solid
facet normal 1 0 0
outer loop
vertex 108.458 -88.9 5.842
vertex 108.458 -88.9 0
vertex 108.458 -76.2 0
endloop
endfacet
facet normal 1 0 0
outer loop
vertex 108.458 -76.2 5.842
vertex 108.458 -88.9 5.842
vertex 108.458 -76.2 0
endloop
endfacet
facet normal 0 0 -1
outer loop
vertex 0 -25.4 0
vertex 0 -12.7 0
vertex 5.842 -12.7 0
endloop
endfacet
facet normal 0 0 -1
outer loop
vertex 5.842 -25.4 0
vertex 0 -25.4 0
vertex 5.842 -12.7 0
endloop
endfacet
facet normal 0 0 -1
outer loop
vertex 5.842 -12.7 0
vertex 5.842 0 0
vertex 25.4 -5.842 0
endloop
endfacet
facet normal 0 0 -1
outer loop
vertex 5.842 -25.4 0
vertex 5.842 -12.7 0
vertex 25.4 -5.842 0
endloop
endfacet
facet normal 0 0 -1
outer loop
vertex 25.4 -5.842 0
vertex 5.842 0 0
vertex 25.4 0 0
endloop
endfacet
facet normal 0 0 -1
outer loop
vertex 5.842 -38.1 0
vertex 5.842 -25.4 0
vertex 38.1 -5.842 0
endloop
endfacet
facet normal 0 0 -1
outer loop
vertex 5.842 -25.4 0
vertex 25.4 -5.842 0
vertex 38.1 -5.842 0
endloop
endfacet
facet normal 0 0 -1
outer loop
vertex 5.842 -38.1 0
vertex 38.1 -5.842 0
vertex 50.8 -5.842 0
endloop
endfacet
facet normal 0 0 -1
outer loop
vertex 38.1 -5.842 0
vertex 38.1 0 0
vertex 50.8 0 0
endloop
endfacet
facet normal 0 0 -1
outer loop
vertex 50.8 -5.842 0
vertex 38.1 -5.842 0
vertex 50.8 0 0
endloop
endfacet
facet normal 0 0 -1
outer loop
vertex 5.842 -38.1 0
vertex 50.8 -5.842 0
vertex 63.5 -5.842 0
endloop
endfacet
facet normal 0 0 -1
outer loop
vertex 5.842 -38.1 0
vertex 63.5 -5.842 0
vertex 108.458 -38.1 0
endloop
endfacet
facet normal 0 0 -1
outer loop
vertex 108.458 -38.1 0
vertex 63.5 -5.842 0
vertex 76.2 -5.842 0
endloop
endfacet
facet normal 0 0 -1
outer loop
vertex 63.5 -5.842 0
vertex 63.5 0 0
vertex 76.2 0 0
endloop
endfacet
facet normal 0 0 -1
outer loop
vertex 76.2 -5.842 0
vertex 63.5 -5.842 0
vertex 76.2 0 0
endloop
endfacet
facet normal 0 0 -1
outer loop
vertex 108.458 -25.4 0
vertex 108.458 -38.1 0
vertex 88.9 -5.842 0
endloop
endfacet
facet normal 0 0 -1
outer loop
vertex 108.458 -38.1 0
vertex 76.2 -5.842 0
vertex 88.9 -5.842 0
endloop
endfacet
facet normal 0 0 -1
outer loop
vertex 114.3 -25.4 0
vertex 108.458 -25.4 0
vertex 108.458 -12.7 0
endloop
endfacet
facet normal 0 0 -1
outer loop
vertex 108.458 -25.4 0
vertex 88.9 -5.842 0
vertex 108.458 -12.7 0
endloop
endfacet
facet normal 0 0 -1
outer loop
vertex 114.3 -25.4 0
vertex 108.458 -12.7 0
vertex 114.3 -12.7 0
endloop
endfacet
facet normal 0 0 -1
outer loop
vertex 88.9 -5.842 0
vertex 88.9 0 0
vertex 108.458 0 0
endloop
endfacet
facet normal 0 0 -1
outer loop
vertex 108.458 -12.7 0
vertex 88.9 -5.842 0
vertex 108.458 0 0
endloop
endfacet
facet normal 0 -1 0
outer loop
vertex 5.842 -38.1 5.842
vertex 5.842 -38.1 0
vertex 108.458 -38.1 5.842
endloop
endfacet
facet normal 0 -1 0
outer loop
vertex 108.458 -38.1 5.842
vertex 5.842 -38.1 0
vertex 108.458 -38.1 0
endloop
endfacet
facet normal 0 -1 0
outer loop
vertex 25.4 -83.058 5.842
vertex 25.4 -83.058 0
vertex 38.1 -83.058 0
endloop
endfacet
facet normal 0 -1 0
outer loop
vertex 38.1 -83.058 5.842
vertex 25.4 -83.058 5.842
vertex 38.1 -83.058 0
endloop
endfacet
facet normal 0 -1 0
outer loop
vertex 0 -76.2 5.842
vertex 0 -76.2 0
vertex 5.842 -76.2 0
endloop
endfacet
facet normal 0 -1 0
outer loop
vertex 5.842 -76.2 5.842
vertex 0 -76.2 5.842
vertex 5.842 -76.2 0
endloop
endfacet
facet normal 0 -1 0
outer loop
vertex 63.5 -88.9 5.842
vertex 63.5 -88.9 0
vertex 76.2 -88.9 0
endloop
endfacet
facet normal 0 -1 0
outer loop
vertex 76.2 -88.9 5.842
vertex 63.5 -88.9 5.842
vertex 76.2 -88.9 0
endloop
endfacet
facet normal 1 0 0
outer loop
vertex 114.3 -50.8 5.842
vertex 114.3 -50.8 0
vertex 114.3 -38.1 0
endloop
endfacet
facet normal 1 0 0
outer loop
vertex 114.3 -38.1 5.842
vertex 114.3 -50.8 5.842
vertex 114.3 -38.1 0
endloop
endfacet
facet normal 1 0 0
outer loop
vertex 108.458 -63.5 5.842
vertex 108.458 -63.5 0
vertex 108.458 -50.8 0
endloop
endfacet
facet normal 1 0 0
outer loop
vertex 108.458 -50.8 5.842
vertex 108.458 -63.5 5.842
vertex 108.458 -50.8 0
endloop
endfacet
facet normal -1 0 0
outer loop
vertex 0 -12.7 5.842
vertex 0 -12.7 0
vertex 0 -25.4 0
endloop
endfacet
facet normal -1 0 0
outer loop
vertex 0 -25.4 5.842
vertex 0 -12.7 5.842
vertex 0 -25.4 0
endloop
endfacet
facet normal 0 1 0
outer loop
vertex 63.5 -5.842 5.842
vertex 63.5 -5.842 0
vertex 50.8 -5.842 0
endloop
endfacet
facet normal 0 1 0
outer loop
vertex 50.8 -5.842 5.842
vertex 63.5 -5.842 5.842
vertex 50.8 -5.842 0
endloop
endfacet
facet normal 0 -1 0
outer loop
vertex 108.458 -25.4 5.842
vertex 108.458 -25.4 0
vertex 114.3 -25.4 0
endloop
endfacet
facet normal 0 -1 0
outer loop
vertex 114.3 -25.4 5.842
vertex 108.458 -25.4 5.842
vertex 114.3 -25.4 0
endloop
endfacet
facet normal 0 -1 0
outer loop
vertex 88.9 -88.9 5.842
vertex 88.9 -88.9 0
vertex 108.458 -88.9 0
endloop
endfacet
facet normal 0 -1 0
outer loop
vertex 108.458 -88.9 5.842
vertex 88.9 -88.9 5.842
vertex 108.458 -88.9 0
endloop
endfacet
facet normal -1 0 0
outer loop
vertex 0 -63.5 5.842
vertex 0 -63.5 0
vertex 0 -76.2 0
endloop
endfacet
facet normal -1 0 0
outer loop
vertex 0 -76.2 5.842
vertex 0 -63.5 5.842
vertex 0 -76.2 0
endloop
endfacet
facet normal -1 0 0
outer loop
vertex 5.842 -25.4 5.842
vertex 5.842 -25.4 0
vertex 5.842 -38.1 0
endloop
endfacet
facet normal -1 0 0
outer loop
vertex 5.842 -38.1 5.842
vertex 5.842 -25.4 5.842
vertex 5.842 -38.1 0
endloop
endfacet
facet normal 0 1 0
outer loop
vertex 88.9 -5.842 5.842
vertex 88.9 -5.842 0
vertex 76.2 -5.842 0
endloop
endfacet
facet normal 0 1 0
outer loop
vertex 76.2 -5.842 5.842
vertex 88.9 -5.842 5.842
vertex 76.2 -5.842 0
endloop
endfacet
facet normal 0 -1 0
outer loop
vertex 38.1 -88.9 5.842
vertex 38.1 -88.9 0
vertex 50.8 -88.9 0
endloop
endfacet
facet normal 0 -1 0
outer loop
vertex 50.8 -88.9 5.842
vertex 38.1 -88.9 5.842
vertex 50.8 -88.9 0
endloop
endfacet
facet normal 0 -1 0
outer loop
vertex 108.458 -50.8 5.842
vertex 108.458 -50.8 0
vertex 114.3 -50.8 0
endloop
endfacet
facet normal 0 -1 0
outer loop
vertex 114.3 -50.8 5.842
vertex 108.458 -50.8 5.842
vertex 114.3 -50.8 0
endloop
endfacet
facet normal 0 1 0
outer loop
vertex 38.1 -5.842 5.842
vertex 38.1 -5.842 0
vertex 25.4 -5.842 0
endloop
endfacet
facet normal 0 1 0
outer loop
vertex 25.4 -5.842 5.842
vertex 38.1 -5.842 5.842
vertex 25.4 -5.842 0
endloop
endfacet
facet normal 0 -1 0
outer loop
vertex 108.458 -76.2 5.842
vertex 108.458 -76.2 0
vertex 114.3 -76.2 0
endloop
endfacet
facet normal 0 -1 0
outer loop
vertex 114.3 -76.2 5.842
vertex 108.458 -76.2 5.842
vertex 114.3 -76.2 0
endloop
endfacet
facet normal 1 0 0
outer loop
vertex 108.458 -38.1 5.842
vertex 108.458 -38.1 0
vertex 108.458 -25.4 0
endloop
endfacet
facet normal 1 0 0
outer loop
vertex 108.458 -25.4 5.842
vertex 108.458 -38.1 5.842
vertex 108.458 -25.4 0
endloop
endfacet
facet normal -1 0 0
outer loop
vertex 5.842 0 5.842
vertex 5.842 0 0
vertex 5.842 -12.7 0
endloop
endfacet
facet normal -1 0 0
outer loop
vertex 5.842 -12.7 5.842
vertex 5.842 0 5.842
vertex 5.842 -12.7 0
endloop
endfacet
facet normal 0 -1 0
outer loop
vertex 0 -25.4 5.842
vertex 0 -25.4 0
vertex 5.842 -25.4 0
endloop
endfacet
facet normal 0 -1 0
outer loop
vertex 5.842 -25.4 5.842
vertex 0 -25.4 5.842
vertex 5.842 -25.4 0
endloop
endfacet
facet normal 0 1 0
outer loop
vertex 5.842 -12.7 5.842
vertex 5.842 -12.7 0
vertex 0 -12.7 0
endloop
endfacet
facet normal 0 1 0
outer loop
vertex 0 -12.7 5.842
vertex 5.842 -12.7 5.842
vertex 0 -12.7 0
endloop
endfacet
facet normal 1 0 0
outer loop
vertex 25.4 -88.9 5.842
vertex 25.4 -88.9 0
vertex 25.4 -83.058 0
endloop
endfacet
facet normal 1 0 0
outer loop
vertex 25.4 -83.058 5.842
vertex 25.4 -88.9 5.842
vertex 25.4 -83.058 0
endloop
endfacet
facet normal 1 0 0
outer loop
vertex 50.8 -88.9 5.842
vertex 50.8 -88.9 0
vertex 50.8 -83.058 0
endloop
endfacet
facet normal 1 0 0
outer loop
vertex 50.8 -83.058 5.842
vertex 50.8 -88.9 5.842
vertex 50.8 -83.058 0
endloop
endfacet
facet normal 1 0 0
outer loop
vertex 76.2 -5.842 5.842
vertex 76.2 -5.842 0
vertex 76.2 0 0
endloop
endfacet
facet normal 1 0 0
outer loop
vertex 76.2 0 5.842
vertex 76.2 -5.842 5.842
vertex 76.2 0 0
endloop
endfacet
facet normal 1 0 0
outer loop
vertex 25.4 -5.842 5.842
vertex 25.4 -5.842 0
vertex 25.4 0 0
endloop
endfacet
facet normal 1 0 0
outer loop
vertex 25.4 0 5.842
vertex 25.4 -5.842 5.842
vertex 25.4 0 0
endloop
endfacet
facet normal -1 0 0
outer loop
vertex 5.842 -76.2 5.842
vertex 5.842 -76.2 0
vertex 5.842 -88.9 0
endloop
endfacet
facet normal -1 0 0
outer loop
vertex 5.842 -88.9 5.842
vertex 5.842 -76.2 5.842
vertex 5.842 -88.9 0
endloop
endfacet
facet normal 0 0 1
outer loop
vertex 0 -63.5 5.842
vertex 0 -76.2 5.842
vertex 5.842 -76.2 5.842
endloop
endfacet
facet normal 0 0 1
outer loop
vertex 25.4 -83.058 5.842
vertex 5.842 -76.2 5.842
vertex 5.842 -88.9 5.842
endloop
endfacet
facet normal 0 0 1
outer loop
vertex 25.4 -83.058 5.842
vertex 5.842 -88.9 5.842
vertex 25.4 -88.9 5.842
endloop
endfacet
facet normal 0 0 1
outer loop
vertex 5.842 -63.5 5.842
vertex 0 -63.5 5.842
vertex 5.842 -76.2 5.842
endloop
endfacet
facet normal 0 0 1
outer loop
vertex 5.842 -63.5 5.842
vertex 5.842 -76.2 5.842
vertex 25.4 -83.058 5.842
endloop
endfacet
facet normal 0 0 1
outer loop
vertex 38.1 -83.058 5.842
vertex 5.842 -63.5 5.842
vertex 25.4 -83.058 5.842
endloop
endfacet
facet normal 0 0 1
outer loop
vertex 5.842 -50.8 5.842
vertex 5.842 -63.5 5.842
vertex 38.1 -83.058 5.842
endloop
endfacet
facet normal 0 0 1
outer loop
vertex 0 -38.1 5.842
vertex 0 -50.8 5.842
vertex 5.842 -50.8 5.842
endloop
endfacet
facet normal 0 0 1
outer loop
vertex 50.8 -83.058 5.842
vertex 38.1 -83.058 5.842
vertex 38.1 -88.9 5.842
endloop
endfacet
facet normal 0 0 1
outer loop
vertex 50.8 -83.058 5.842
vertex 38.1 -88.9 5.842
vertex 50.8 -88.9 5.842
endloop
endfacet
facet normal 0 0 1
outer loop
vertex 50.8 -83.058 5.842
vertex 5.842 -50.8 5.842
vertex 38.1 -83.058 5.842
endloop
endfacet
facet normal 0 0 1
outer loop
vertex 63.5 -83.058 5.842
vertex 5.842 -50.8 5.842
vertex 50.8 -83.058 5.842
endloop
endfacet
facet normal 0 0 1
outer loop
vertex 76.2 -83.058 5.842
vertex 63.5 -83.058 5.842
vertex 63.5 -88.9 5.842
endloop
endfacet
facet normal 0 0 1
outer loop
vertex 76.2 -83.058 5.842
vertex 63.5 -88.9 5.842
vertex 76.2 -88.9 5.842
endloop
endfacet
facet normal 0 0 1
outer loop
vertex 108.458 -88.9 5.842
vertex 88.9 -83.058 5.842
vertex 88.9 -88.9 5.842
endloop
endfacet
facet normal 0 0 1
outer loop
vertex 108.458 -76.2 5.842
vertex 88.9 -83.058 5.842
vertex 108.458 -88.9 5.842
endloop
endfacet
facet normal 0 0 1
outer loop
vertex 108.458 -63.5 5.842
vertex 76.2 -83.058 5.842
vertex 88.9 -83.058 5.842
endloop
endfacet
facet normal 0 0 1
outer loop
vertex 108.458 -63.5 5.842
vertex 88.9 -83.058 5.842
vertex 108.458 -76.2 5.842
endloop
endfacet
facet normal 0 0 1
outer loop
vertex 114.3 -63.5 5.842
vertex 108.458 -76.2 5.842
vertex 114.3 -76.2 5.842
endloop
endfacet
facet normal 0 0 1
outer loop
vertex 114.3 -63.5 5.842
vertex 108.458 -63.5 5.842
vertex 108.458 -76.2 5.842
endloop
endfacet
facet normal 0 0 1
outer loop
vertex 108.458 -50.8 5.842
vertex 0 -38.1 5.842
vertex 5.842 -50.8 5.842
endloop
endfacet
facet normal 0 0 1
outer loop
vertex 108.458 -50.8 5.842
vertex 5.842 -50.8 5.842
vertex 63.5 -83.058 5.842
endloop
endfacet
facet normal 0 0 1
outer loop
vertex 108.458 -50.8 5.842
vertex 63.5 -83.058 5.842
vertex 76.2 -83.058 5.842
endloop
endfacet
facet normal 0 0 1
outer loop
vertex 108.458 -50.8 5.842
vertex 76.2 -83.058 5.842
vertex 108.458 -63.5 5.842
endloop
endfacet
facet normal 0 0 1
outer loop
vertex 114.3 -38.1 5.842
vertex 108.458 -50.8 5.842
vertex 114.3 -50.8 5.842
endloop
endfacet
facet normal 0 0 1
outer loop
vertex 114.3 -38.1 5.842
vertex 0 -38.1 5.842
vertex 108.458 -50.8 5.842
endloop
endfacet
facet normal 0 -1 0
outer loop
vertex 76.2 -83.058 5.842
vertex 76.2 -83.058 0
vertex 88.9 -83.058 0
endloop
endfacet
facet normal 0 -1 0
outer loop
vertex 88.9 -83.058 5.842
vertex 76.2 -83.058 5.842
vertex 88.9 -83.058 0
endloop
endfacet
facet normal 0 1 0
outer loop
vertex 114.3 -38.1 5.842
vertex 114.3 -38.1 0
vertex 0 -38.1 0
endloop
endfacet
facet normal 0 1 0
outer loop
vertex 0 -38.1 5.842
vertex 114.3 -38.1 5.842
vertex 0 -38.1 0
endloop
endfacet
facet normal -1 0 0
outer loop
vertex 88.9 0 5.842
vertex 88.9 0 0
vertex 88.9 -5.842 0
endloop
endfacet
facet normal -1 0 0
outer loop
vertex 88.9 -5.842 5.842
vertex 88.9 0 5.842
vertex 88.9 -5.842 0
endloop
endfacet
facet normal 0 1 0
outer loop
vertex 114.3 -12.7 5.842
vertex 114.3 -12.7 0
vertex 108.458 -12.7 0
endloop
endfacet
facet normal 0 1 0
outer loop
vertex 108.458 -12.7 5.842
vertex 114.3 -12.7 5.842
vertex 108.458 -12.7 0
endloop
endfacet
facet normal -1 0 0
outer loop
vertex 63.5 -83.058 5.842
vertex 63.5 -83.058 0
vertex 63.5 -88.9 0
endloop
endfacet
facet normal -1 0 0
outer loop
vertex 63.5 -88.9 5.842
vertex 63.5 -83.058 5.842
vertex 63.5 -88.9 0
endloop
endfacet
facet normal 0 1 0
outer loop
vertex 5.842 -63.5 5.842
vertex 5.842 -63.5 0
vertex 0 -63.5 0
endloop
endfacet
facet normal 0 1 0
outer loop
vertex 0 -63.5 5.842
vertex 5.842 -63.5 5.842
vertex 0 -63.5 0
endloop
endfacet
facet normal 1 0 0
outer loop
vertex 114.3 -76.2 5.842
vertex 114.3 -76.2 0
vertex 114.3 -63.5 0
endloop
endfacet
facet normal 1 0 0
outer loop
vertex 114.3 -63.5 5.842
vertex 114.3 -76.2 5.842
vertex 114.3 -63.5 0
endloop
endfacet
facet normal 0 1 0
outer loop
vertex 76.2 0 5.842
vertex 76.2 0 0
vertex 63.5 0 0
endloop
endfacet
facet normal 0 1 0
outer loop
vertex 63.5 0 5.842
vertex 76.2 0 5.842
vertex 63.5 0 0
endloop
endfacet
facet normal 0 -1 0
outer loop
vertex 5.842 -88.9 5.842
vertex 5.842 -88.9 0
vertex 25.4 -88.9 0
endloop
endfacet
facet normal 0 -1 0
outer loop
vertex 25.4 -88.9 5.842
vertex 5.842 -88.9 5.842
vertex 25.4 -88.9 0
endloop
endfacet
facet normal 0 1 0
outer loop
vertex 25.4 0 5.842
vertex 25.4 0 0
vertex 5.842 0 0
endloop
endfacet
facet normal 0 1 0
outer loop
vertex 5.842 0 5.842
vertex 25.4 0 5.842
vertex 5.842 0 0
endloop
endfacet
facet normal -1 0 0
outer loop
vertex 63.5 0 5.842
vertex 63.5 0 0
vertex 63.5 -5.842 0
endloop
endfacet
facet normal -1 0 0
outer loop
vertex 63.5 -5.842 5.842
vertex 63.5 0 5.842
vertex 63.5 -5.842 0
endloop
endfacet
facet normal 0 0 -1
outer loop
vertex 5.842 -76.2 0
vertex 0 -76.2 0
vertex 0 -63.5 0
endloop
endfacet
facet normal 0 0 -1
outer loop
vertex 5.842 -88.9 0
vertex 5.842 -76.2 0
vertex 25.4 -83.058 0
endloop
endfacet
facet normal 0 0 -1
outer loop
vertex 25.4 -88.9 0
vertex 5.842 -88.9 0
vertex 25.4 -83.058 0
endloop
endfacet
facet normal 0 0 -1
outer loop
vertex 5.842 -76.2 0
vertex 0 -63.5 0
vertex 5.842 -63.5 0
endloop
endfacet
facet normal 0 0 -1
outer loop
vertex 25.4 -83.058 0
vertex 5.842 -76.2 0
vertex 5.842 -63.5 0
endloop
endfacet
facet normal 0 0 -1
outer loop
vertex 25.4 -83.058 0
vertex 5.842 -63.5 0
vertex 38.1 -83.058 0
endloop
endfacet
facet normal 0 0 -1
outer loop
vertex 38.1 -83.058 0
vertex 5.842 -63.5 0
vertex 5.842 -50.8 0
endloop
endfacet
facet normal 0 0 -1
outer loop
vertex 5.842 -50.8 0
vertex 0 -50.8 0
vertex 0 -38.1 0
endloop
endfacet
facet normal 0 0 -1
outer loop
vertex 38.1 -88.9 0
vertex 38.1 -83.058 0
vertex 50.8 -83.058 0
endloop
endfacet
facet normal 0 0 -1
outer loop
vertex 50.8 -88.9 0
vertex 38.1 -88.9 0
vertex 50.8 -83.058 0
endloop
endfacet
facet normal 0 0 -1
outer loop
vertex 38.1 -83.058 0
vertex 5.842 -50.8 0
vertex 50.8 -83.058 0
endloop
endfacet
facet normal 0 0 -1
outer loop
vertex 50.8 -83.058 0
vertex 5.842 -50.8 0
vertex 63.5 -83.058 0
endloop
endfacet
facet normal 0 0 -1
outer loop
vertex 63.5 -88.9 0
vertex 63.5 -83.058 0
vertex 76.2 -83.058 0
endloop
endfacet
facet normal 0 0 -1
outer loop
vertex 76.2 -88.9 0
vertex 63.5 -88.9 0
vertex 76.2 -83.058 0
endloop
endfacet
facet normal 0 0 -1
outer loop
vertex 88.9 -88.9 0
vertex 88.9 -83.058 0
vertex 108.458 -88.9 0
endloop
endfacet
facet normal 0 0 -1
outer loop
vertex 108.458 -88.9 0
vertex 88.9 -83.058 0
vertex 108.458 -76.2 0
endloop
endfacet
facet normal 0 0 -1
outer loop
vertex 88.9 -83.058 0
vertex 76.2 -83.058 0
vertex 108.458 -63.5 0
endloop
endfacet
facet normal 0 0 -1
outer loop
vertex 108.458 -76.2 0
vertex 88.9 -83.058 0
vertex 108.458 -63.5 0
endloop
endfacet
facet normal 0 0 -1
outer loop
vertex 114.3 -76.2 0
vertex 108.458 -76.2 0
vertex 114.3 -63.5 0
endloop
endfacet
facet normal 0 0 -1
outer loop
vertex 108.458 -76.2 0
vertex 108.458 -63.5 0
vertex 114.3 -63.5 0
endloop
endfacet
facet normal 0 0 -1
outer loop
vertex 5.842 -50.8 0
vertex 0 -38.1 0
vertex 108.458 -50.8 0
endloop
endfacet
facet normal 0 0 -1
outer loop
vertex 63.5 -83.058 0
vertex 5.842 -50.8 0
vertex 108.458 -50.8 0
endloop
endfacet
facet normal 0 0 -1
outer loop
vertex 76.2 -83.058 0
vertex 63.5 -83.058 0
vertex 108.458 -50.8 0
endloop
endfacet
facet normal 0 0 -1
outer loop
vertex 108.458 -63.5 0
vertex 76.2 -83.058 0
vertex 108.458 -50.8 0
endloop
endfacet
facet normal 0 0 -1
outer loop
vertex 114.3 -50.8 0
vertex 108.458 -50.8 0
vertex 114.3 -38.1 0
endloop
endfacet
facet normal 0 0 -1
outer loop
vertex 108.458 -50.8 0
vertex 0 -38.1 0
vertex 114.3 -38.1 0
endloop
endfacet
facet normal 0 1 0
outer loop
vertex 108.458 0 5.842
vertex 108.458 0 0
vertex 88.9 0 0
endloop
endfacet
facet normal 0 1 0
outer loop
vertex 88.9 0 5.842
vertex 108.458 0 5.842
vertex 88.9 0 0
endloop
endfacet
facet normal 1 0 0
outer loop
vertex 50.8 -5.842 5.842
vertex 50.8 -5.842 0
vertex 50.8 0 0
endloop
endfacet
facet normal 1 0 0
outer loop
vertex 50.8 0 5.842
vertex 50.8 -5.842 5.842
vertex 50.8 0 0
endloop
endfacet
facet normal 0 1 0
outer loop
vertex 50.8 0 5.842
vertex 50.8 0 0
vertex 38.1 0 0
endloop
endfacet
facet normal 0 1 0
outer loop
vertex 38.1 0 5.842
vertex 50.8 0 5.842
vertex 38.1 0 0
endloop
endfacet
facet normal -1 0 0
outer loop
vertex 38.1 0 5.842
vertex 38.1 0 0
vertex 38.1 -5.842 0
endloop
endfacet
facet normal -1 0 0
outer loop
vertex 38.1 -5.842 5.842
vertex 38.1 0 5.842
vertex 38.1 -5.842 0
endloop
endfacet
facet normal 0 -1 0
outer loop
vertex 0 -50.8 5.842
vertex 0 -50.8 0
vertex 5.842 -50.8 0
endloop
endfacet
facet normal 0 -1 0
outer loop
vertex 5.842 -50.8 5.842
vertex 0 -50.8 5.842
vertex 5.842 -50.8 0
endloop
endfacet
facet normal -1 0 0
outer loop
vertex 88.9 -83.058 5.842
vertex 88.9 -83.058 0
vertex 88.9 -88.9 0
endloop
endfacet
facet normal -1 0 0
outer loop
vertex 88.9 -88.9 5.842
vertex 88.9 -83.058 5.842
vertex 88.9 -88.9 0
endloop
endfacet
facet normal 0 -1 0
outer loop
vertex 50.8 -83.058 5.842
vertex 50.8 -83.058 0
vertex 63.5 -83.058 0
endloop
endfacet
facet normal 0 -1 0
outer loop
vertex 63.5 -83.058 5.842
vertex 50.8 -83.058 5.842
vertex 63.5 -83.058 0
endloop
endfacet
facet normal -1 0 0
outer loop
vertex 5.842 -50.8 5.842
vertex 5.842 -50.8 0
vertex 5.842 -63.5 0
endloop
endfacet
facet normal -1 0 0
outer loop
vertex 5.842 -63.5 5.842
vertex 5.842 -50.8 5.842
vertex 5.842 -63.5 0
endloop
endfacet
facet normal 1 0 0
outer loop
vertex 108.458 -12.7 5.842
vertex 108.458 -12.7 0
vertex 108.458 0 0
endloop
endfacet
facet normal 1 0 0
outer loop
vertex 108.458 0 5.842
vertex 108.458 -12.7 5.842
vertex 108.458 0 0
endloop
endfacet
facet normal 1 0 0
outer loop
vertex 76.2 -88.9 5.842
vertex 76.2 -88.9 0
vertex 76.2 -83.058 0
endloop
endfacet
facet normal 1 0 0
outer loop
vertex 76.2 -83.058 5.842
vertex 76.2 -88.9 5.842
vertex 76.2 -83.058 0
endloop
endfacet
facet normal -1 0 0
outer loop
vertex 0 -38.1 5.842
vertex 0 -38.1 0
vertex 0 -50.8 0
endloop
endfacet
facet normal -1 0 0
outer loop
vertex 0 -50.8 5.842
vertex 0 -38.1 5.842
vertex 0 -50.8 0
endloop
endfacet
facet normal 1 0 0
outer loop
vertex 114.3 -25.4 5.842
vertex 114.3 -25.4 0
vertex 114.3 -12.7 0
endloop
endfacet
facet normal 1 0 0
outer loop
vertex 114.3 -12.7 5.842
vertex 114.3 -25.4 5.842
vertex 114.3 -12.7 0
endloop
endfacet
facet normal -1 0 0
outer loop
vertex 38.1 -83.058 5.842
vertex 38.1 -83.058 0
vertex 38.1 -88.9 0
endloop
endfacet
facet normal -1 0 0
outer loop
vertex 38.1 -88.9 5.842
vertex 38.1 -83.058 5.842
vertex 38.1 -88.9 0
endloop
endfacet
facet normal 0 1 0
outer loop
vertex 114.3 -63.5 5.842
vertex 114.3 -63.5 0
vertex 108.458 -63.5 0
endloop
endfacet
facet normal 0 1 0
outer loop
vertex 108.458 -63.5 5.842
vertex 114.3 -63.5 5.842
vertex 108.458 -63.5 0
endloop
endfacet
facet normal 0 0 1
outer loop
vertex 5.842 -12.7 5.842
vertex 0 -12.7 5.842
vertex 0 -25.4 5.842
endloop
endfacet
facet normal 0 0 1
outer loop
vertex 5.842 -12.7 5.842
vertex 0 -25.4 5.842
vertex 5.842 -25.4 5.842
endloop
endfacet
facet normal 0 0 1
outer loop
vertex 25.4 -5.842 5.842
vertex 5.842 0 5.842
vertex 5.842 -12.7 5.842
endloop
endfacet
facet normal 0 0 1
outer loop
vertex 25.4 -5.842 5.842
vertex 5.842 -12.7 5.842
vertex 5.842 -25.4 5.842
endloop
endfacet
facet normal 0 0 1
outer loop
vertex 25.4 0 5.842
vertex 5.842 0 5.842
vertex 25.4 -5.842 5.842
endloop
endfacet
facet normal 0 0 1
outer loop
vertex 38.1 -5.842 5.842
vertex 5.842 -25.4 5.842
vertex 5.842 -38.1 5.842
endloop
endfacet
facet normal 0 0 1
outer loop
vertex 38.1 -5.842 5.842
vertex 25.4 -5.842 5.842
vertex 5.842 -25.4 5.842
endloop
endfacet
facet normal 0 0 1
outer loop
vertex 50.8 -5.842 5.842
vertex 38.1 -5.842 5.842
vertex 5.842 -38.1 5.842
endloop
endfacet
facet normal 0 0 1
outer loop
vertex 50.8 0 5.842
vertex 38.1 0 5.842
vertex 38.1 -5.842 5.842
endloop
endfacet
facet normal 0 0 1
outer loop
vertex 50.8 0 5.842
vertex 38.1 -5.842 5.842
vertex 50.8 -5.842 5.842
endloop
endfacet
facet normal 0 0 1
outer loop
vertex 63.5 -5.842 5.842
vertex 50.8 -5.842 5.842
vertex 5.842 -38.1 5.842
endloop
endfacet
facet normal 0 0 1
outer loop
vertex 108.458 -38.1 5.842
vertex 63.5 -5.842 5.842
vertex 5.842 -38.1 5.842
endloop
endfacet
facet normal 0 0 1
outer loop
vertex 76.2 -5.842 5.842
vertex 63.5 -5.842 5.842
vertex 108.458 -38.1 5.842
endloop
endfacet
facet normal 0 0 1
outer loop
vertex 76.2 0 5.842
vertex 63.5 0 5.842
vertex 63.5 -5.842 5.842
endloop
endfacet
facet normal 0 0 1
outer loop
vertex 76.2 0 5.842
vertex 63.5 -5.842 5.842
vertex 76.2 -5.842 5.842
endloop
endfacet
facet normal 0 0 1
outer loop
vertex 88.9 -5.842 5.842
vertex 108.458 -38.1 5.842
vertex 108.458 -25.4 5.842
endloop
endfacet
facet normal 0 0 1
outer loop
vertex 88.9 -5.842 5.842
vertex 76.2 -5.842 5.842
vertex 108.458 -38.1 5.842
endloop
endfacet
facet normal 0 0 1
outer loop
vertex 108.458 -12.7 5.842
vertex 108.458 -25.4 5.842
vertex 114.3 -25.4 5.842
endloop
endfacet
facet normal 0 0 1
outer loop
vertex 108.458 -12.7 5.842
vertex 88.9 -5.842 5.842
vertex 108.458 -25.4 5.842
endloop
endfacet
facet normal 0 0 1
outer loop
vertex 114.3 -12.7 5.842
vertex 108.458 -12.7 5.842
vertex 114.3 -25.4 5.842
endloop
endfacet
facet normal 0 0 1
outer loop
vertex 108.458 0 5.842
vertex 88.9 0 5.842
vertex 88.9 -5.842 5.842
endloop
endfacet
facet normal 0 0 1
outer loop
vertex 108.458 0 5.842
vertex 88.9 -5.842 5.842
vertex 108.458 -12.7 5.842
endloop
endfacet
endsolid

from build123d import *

# Parameters (mm, degrees)
F1_DEPTH = 5.842
F2_DEPTH = 5.842


with BuildPart() as f1:
    # F0 (on Top) → F1 (new body)
    with BuildSketch(Plane.XY):
        Polygon((25.4, 0), (5.842, 0), (5.842, -12.7), (0, -12.7), (0, -25.4), (5.842, -25.4), (5.842, -38.1), (108.458, -38.1), (108.458, -25.4), (114.3, -25.4), (114.3, -12.7), (108.458, -12.7), (108.458, 0), (88.9, 0), (88.9, -5.842), (76.2, -5.842), (76.2, 0), (63.5, 0), (63.5, -5.842), (50.8, -5.842), (50.8, 0), (38.1, 0), (38.1, -5.842), (25.4, -5.842), align=None)
    extrude(amount=F1_DEPTH)


with BuildPart() as f2:
    # F0 (on Top) → F2 (new body)
    with BuildSketch(Plane.XY):
        Polygon((108.458, -38.1), (5.842, -38.1), (0, -38.1), (0, -50.8), (5.842, -50.8), (5.842, -63.5), (0, -63.5), (0, -76.2), (5.842, -76.2), (5.842, -88.9), (25.4, -88.9), (25.4, -83.058), (38.1, -83.058), (38.1, -88.9), (50.8, -88.9), (50.8, -83.058), (63.5, -83.058), (63.5, -88.9), (76.2, -88.9), (76.2, -83.058), (88.9, -83.058), (88.9, -88.9), (108.458, -88.9), (108.458, -76.2), (114.3, -76.2), (114.3, -63.5), (108.458, -63.5), (108.458, -50.8), (114.3, -50.8), (114.3, -38.1), align=None)
    extrude(amount=F2_DEPTH)


solid = Compound([f1.part, f2.part])
